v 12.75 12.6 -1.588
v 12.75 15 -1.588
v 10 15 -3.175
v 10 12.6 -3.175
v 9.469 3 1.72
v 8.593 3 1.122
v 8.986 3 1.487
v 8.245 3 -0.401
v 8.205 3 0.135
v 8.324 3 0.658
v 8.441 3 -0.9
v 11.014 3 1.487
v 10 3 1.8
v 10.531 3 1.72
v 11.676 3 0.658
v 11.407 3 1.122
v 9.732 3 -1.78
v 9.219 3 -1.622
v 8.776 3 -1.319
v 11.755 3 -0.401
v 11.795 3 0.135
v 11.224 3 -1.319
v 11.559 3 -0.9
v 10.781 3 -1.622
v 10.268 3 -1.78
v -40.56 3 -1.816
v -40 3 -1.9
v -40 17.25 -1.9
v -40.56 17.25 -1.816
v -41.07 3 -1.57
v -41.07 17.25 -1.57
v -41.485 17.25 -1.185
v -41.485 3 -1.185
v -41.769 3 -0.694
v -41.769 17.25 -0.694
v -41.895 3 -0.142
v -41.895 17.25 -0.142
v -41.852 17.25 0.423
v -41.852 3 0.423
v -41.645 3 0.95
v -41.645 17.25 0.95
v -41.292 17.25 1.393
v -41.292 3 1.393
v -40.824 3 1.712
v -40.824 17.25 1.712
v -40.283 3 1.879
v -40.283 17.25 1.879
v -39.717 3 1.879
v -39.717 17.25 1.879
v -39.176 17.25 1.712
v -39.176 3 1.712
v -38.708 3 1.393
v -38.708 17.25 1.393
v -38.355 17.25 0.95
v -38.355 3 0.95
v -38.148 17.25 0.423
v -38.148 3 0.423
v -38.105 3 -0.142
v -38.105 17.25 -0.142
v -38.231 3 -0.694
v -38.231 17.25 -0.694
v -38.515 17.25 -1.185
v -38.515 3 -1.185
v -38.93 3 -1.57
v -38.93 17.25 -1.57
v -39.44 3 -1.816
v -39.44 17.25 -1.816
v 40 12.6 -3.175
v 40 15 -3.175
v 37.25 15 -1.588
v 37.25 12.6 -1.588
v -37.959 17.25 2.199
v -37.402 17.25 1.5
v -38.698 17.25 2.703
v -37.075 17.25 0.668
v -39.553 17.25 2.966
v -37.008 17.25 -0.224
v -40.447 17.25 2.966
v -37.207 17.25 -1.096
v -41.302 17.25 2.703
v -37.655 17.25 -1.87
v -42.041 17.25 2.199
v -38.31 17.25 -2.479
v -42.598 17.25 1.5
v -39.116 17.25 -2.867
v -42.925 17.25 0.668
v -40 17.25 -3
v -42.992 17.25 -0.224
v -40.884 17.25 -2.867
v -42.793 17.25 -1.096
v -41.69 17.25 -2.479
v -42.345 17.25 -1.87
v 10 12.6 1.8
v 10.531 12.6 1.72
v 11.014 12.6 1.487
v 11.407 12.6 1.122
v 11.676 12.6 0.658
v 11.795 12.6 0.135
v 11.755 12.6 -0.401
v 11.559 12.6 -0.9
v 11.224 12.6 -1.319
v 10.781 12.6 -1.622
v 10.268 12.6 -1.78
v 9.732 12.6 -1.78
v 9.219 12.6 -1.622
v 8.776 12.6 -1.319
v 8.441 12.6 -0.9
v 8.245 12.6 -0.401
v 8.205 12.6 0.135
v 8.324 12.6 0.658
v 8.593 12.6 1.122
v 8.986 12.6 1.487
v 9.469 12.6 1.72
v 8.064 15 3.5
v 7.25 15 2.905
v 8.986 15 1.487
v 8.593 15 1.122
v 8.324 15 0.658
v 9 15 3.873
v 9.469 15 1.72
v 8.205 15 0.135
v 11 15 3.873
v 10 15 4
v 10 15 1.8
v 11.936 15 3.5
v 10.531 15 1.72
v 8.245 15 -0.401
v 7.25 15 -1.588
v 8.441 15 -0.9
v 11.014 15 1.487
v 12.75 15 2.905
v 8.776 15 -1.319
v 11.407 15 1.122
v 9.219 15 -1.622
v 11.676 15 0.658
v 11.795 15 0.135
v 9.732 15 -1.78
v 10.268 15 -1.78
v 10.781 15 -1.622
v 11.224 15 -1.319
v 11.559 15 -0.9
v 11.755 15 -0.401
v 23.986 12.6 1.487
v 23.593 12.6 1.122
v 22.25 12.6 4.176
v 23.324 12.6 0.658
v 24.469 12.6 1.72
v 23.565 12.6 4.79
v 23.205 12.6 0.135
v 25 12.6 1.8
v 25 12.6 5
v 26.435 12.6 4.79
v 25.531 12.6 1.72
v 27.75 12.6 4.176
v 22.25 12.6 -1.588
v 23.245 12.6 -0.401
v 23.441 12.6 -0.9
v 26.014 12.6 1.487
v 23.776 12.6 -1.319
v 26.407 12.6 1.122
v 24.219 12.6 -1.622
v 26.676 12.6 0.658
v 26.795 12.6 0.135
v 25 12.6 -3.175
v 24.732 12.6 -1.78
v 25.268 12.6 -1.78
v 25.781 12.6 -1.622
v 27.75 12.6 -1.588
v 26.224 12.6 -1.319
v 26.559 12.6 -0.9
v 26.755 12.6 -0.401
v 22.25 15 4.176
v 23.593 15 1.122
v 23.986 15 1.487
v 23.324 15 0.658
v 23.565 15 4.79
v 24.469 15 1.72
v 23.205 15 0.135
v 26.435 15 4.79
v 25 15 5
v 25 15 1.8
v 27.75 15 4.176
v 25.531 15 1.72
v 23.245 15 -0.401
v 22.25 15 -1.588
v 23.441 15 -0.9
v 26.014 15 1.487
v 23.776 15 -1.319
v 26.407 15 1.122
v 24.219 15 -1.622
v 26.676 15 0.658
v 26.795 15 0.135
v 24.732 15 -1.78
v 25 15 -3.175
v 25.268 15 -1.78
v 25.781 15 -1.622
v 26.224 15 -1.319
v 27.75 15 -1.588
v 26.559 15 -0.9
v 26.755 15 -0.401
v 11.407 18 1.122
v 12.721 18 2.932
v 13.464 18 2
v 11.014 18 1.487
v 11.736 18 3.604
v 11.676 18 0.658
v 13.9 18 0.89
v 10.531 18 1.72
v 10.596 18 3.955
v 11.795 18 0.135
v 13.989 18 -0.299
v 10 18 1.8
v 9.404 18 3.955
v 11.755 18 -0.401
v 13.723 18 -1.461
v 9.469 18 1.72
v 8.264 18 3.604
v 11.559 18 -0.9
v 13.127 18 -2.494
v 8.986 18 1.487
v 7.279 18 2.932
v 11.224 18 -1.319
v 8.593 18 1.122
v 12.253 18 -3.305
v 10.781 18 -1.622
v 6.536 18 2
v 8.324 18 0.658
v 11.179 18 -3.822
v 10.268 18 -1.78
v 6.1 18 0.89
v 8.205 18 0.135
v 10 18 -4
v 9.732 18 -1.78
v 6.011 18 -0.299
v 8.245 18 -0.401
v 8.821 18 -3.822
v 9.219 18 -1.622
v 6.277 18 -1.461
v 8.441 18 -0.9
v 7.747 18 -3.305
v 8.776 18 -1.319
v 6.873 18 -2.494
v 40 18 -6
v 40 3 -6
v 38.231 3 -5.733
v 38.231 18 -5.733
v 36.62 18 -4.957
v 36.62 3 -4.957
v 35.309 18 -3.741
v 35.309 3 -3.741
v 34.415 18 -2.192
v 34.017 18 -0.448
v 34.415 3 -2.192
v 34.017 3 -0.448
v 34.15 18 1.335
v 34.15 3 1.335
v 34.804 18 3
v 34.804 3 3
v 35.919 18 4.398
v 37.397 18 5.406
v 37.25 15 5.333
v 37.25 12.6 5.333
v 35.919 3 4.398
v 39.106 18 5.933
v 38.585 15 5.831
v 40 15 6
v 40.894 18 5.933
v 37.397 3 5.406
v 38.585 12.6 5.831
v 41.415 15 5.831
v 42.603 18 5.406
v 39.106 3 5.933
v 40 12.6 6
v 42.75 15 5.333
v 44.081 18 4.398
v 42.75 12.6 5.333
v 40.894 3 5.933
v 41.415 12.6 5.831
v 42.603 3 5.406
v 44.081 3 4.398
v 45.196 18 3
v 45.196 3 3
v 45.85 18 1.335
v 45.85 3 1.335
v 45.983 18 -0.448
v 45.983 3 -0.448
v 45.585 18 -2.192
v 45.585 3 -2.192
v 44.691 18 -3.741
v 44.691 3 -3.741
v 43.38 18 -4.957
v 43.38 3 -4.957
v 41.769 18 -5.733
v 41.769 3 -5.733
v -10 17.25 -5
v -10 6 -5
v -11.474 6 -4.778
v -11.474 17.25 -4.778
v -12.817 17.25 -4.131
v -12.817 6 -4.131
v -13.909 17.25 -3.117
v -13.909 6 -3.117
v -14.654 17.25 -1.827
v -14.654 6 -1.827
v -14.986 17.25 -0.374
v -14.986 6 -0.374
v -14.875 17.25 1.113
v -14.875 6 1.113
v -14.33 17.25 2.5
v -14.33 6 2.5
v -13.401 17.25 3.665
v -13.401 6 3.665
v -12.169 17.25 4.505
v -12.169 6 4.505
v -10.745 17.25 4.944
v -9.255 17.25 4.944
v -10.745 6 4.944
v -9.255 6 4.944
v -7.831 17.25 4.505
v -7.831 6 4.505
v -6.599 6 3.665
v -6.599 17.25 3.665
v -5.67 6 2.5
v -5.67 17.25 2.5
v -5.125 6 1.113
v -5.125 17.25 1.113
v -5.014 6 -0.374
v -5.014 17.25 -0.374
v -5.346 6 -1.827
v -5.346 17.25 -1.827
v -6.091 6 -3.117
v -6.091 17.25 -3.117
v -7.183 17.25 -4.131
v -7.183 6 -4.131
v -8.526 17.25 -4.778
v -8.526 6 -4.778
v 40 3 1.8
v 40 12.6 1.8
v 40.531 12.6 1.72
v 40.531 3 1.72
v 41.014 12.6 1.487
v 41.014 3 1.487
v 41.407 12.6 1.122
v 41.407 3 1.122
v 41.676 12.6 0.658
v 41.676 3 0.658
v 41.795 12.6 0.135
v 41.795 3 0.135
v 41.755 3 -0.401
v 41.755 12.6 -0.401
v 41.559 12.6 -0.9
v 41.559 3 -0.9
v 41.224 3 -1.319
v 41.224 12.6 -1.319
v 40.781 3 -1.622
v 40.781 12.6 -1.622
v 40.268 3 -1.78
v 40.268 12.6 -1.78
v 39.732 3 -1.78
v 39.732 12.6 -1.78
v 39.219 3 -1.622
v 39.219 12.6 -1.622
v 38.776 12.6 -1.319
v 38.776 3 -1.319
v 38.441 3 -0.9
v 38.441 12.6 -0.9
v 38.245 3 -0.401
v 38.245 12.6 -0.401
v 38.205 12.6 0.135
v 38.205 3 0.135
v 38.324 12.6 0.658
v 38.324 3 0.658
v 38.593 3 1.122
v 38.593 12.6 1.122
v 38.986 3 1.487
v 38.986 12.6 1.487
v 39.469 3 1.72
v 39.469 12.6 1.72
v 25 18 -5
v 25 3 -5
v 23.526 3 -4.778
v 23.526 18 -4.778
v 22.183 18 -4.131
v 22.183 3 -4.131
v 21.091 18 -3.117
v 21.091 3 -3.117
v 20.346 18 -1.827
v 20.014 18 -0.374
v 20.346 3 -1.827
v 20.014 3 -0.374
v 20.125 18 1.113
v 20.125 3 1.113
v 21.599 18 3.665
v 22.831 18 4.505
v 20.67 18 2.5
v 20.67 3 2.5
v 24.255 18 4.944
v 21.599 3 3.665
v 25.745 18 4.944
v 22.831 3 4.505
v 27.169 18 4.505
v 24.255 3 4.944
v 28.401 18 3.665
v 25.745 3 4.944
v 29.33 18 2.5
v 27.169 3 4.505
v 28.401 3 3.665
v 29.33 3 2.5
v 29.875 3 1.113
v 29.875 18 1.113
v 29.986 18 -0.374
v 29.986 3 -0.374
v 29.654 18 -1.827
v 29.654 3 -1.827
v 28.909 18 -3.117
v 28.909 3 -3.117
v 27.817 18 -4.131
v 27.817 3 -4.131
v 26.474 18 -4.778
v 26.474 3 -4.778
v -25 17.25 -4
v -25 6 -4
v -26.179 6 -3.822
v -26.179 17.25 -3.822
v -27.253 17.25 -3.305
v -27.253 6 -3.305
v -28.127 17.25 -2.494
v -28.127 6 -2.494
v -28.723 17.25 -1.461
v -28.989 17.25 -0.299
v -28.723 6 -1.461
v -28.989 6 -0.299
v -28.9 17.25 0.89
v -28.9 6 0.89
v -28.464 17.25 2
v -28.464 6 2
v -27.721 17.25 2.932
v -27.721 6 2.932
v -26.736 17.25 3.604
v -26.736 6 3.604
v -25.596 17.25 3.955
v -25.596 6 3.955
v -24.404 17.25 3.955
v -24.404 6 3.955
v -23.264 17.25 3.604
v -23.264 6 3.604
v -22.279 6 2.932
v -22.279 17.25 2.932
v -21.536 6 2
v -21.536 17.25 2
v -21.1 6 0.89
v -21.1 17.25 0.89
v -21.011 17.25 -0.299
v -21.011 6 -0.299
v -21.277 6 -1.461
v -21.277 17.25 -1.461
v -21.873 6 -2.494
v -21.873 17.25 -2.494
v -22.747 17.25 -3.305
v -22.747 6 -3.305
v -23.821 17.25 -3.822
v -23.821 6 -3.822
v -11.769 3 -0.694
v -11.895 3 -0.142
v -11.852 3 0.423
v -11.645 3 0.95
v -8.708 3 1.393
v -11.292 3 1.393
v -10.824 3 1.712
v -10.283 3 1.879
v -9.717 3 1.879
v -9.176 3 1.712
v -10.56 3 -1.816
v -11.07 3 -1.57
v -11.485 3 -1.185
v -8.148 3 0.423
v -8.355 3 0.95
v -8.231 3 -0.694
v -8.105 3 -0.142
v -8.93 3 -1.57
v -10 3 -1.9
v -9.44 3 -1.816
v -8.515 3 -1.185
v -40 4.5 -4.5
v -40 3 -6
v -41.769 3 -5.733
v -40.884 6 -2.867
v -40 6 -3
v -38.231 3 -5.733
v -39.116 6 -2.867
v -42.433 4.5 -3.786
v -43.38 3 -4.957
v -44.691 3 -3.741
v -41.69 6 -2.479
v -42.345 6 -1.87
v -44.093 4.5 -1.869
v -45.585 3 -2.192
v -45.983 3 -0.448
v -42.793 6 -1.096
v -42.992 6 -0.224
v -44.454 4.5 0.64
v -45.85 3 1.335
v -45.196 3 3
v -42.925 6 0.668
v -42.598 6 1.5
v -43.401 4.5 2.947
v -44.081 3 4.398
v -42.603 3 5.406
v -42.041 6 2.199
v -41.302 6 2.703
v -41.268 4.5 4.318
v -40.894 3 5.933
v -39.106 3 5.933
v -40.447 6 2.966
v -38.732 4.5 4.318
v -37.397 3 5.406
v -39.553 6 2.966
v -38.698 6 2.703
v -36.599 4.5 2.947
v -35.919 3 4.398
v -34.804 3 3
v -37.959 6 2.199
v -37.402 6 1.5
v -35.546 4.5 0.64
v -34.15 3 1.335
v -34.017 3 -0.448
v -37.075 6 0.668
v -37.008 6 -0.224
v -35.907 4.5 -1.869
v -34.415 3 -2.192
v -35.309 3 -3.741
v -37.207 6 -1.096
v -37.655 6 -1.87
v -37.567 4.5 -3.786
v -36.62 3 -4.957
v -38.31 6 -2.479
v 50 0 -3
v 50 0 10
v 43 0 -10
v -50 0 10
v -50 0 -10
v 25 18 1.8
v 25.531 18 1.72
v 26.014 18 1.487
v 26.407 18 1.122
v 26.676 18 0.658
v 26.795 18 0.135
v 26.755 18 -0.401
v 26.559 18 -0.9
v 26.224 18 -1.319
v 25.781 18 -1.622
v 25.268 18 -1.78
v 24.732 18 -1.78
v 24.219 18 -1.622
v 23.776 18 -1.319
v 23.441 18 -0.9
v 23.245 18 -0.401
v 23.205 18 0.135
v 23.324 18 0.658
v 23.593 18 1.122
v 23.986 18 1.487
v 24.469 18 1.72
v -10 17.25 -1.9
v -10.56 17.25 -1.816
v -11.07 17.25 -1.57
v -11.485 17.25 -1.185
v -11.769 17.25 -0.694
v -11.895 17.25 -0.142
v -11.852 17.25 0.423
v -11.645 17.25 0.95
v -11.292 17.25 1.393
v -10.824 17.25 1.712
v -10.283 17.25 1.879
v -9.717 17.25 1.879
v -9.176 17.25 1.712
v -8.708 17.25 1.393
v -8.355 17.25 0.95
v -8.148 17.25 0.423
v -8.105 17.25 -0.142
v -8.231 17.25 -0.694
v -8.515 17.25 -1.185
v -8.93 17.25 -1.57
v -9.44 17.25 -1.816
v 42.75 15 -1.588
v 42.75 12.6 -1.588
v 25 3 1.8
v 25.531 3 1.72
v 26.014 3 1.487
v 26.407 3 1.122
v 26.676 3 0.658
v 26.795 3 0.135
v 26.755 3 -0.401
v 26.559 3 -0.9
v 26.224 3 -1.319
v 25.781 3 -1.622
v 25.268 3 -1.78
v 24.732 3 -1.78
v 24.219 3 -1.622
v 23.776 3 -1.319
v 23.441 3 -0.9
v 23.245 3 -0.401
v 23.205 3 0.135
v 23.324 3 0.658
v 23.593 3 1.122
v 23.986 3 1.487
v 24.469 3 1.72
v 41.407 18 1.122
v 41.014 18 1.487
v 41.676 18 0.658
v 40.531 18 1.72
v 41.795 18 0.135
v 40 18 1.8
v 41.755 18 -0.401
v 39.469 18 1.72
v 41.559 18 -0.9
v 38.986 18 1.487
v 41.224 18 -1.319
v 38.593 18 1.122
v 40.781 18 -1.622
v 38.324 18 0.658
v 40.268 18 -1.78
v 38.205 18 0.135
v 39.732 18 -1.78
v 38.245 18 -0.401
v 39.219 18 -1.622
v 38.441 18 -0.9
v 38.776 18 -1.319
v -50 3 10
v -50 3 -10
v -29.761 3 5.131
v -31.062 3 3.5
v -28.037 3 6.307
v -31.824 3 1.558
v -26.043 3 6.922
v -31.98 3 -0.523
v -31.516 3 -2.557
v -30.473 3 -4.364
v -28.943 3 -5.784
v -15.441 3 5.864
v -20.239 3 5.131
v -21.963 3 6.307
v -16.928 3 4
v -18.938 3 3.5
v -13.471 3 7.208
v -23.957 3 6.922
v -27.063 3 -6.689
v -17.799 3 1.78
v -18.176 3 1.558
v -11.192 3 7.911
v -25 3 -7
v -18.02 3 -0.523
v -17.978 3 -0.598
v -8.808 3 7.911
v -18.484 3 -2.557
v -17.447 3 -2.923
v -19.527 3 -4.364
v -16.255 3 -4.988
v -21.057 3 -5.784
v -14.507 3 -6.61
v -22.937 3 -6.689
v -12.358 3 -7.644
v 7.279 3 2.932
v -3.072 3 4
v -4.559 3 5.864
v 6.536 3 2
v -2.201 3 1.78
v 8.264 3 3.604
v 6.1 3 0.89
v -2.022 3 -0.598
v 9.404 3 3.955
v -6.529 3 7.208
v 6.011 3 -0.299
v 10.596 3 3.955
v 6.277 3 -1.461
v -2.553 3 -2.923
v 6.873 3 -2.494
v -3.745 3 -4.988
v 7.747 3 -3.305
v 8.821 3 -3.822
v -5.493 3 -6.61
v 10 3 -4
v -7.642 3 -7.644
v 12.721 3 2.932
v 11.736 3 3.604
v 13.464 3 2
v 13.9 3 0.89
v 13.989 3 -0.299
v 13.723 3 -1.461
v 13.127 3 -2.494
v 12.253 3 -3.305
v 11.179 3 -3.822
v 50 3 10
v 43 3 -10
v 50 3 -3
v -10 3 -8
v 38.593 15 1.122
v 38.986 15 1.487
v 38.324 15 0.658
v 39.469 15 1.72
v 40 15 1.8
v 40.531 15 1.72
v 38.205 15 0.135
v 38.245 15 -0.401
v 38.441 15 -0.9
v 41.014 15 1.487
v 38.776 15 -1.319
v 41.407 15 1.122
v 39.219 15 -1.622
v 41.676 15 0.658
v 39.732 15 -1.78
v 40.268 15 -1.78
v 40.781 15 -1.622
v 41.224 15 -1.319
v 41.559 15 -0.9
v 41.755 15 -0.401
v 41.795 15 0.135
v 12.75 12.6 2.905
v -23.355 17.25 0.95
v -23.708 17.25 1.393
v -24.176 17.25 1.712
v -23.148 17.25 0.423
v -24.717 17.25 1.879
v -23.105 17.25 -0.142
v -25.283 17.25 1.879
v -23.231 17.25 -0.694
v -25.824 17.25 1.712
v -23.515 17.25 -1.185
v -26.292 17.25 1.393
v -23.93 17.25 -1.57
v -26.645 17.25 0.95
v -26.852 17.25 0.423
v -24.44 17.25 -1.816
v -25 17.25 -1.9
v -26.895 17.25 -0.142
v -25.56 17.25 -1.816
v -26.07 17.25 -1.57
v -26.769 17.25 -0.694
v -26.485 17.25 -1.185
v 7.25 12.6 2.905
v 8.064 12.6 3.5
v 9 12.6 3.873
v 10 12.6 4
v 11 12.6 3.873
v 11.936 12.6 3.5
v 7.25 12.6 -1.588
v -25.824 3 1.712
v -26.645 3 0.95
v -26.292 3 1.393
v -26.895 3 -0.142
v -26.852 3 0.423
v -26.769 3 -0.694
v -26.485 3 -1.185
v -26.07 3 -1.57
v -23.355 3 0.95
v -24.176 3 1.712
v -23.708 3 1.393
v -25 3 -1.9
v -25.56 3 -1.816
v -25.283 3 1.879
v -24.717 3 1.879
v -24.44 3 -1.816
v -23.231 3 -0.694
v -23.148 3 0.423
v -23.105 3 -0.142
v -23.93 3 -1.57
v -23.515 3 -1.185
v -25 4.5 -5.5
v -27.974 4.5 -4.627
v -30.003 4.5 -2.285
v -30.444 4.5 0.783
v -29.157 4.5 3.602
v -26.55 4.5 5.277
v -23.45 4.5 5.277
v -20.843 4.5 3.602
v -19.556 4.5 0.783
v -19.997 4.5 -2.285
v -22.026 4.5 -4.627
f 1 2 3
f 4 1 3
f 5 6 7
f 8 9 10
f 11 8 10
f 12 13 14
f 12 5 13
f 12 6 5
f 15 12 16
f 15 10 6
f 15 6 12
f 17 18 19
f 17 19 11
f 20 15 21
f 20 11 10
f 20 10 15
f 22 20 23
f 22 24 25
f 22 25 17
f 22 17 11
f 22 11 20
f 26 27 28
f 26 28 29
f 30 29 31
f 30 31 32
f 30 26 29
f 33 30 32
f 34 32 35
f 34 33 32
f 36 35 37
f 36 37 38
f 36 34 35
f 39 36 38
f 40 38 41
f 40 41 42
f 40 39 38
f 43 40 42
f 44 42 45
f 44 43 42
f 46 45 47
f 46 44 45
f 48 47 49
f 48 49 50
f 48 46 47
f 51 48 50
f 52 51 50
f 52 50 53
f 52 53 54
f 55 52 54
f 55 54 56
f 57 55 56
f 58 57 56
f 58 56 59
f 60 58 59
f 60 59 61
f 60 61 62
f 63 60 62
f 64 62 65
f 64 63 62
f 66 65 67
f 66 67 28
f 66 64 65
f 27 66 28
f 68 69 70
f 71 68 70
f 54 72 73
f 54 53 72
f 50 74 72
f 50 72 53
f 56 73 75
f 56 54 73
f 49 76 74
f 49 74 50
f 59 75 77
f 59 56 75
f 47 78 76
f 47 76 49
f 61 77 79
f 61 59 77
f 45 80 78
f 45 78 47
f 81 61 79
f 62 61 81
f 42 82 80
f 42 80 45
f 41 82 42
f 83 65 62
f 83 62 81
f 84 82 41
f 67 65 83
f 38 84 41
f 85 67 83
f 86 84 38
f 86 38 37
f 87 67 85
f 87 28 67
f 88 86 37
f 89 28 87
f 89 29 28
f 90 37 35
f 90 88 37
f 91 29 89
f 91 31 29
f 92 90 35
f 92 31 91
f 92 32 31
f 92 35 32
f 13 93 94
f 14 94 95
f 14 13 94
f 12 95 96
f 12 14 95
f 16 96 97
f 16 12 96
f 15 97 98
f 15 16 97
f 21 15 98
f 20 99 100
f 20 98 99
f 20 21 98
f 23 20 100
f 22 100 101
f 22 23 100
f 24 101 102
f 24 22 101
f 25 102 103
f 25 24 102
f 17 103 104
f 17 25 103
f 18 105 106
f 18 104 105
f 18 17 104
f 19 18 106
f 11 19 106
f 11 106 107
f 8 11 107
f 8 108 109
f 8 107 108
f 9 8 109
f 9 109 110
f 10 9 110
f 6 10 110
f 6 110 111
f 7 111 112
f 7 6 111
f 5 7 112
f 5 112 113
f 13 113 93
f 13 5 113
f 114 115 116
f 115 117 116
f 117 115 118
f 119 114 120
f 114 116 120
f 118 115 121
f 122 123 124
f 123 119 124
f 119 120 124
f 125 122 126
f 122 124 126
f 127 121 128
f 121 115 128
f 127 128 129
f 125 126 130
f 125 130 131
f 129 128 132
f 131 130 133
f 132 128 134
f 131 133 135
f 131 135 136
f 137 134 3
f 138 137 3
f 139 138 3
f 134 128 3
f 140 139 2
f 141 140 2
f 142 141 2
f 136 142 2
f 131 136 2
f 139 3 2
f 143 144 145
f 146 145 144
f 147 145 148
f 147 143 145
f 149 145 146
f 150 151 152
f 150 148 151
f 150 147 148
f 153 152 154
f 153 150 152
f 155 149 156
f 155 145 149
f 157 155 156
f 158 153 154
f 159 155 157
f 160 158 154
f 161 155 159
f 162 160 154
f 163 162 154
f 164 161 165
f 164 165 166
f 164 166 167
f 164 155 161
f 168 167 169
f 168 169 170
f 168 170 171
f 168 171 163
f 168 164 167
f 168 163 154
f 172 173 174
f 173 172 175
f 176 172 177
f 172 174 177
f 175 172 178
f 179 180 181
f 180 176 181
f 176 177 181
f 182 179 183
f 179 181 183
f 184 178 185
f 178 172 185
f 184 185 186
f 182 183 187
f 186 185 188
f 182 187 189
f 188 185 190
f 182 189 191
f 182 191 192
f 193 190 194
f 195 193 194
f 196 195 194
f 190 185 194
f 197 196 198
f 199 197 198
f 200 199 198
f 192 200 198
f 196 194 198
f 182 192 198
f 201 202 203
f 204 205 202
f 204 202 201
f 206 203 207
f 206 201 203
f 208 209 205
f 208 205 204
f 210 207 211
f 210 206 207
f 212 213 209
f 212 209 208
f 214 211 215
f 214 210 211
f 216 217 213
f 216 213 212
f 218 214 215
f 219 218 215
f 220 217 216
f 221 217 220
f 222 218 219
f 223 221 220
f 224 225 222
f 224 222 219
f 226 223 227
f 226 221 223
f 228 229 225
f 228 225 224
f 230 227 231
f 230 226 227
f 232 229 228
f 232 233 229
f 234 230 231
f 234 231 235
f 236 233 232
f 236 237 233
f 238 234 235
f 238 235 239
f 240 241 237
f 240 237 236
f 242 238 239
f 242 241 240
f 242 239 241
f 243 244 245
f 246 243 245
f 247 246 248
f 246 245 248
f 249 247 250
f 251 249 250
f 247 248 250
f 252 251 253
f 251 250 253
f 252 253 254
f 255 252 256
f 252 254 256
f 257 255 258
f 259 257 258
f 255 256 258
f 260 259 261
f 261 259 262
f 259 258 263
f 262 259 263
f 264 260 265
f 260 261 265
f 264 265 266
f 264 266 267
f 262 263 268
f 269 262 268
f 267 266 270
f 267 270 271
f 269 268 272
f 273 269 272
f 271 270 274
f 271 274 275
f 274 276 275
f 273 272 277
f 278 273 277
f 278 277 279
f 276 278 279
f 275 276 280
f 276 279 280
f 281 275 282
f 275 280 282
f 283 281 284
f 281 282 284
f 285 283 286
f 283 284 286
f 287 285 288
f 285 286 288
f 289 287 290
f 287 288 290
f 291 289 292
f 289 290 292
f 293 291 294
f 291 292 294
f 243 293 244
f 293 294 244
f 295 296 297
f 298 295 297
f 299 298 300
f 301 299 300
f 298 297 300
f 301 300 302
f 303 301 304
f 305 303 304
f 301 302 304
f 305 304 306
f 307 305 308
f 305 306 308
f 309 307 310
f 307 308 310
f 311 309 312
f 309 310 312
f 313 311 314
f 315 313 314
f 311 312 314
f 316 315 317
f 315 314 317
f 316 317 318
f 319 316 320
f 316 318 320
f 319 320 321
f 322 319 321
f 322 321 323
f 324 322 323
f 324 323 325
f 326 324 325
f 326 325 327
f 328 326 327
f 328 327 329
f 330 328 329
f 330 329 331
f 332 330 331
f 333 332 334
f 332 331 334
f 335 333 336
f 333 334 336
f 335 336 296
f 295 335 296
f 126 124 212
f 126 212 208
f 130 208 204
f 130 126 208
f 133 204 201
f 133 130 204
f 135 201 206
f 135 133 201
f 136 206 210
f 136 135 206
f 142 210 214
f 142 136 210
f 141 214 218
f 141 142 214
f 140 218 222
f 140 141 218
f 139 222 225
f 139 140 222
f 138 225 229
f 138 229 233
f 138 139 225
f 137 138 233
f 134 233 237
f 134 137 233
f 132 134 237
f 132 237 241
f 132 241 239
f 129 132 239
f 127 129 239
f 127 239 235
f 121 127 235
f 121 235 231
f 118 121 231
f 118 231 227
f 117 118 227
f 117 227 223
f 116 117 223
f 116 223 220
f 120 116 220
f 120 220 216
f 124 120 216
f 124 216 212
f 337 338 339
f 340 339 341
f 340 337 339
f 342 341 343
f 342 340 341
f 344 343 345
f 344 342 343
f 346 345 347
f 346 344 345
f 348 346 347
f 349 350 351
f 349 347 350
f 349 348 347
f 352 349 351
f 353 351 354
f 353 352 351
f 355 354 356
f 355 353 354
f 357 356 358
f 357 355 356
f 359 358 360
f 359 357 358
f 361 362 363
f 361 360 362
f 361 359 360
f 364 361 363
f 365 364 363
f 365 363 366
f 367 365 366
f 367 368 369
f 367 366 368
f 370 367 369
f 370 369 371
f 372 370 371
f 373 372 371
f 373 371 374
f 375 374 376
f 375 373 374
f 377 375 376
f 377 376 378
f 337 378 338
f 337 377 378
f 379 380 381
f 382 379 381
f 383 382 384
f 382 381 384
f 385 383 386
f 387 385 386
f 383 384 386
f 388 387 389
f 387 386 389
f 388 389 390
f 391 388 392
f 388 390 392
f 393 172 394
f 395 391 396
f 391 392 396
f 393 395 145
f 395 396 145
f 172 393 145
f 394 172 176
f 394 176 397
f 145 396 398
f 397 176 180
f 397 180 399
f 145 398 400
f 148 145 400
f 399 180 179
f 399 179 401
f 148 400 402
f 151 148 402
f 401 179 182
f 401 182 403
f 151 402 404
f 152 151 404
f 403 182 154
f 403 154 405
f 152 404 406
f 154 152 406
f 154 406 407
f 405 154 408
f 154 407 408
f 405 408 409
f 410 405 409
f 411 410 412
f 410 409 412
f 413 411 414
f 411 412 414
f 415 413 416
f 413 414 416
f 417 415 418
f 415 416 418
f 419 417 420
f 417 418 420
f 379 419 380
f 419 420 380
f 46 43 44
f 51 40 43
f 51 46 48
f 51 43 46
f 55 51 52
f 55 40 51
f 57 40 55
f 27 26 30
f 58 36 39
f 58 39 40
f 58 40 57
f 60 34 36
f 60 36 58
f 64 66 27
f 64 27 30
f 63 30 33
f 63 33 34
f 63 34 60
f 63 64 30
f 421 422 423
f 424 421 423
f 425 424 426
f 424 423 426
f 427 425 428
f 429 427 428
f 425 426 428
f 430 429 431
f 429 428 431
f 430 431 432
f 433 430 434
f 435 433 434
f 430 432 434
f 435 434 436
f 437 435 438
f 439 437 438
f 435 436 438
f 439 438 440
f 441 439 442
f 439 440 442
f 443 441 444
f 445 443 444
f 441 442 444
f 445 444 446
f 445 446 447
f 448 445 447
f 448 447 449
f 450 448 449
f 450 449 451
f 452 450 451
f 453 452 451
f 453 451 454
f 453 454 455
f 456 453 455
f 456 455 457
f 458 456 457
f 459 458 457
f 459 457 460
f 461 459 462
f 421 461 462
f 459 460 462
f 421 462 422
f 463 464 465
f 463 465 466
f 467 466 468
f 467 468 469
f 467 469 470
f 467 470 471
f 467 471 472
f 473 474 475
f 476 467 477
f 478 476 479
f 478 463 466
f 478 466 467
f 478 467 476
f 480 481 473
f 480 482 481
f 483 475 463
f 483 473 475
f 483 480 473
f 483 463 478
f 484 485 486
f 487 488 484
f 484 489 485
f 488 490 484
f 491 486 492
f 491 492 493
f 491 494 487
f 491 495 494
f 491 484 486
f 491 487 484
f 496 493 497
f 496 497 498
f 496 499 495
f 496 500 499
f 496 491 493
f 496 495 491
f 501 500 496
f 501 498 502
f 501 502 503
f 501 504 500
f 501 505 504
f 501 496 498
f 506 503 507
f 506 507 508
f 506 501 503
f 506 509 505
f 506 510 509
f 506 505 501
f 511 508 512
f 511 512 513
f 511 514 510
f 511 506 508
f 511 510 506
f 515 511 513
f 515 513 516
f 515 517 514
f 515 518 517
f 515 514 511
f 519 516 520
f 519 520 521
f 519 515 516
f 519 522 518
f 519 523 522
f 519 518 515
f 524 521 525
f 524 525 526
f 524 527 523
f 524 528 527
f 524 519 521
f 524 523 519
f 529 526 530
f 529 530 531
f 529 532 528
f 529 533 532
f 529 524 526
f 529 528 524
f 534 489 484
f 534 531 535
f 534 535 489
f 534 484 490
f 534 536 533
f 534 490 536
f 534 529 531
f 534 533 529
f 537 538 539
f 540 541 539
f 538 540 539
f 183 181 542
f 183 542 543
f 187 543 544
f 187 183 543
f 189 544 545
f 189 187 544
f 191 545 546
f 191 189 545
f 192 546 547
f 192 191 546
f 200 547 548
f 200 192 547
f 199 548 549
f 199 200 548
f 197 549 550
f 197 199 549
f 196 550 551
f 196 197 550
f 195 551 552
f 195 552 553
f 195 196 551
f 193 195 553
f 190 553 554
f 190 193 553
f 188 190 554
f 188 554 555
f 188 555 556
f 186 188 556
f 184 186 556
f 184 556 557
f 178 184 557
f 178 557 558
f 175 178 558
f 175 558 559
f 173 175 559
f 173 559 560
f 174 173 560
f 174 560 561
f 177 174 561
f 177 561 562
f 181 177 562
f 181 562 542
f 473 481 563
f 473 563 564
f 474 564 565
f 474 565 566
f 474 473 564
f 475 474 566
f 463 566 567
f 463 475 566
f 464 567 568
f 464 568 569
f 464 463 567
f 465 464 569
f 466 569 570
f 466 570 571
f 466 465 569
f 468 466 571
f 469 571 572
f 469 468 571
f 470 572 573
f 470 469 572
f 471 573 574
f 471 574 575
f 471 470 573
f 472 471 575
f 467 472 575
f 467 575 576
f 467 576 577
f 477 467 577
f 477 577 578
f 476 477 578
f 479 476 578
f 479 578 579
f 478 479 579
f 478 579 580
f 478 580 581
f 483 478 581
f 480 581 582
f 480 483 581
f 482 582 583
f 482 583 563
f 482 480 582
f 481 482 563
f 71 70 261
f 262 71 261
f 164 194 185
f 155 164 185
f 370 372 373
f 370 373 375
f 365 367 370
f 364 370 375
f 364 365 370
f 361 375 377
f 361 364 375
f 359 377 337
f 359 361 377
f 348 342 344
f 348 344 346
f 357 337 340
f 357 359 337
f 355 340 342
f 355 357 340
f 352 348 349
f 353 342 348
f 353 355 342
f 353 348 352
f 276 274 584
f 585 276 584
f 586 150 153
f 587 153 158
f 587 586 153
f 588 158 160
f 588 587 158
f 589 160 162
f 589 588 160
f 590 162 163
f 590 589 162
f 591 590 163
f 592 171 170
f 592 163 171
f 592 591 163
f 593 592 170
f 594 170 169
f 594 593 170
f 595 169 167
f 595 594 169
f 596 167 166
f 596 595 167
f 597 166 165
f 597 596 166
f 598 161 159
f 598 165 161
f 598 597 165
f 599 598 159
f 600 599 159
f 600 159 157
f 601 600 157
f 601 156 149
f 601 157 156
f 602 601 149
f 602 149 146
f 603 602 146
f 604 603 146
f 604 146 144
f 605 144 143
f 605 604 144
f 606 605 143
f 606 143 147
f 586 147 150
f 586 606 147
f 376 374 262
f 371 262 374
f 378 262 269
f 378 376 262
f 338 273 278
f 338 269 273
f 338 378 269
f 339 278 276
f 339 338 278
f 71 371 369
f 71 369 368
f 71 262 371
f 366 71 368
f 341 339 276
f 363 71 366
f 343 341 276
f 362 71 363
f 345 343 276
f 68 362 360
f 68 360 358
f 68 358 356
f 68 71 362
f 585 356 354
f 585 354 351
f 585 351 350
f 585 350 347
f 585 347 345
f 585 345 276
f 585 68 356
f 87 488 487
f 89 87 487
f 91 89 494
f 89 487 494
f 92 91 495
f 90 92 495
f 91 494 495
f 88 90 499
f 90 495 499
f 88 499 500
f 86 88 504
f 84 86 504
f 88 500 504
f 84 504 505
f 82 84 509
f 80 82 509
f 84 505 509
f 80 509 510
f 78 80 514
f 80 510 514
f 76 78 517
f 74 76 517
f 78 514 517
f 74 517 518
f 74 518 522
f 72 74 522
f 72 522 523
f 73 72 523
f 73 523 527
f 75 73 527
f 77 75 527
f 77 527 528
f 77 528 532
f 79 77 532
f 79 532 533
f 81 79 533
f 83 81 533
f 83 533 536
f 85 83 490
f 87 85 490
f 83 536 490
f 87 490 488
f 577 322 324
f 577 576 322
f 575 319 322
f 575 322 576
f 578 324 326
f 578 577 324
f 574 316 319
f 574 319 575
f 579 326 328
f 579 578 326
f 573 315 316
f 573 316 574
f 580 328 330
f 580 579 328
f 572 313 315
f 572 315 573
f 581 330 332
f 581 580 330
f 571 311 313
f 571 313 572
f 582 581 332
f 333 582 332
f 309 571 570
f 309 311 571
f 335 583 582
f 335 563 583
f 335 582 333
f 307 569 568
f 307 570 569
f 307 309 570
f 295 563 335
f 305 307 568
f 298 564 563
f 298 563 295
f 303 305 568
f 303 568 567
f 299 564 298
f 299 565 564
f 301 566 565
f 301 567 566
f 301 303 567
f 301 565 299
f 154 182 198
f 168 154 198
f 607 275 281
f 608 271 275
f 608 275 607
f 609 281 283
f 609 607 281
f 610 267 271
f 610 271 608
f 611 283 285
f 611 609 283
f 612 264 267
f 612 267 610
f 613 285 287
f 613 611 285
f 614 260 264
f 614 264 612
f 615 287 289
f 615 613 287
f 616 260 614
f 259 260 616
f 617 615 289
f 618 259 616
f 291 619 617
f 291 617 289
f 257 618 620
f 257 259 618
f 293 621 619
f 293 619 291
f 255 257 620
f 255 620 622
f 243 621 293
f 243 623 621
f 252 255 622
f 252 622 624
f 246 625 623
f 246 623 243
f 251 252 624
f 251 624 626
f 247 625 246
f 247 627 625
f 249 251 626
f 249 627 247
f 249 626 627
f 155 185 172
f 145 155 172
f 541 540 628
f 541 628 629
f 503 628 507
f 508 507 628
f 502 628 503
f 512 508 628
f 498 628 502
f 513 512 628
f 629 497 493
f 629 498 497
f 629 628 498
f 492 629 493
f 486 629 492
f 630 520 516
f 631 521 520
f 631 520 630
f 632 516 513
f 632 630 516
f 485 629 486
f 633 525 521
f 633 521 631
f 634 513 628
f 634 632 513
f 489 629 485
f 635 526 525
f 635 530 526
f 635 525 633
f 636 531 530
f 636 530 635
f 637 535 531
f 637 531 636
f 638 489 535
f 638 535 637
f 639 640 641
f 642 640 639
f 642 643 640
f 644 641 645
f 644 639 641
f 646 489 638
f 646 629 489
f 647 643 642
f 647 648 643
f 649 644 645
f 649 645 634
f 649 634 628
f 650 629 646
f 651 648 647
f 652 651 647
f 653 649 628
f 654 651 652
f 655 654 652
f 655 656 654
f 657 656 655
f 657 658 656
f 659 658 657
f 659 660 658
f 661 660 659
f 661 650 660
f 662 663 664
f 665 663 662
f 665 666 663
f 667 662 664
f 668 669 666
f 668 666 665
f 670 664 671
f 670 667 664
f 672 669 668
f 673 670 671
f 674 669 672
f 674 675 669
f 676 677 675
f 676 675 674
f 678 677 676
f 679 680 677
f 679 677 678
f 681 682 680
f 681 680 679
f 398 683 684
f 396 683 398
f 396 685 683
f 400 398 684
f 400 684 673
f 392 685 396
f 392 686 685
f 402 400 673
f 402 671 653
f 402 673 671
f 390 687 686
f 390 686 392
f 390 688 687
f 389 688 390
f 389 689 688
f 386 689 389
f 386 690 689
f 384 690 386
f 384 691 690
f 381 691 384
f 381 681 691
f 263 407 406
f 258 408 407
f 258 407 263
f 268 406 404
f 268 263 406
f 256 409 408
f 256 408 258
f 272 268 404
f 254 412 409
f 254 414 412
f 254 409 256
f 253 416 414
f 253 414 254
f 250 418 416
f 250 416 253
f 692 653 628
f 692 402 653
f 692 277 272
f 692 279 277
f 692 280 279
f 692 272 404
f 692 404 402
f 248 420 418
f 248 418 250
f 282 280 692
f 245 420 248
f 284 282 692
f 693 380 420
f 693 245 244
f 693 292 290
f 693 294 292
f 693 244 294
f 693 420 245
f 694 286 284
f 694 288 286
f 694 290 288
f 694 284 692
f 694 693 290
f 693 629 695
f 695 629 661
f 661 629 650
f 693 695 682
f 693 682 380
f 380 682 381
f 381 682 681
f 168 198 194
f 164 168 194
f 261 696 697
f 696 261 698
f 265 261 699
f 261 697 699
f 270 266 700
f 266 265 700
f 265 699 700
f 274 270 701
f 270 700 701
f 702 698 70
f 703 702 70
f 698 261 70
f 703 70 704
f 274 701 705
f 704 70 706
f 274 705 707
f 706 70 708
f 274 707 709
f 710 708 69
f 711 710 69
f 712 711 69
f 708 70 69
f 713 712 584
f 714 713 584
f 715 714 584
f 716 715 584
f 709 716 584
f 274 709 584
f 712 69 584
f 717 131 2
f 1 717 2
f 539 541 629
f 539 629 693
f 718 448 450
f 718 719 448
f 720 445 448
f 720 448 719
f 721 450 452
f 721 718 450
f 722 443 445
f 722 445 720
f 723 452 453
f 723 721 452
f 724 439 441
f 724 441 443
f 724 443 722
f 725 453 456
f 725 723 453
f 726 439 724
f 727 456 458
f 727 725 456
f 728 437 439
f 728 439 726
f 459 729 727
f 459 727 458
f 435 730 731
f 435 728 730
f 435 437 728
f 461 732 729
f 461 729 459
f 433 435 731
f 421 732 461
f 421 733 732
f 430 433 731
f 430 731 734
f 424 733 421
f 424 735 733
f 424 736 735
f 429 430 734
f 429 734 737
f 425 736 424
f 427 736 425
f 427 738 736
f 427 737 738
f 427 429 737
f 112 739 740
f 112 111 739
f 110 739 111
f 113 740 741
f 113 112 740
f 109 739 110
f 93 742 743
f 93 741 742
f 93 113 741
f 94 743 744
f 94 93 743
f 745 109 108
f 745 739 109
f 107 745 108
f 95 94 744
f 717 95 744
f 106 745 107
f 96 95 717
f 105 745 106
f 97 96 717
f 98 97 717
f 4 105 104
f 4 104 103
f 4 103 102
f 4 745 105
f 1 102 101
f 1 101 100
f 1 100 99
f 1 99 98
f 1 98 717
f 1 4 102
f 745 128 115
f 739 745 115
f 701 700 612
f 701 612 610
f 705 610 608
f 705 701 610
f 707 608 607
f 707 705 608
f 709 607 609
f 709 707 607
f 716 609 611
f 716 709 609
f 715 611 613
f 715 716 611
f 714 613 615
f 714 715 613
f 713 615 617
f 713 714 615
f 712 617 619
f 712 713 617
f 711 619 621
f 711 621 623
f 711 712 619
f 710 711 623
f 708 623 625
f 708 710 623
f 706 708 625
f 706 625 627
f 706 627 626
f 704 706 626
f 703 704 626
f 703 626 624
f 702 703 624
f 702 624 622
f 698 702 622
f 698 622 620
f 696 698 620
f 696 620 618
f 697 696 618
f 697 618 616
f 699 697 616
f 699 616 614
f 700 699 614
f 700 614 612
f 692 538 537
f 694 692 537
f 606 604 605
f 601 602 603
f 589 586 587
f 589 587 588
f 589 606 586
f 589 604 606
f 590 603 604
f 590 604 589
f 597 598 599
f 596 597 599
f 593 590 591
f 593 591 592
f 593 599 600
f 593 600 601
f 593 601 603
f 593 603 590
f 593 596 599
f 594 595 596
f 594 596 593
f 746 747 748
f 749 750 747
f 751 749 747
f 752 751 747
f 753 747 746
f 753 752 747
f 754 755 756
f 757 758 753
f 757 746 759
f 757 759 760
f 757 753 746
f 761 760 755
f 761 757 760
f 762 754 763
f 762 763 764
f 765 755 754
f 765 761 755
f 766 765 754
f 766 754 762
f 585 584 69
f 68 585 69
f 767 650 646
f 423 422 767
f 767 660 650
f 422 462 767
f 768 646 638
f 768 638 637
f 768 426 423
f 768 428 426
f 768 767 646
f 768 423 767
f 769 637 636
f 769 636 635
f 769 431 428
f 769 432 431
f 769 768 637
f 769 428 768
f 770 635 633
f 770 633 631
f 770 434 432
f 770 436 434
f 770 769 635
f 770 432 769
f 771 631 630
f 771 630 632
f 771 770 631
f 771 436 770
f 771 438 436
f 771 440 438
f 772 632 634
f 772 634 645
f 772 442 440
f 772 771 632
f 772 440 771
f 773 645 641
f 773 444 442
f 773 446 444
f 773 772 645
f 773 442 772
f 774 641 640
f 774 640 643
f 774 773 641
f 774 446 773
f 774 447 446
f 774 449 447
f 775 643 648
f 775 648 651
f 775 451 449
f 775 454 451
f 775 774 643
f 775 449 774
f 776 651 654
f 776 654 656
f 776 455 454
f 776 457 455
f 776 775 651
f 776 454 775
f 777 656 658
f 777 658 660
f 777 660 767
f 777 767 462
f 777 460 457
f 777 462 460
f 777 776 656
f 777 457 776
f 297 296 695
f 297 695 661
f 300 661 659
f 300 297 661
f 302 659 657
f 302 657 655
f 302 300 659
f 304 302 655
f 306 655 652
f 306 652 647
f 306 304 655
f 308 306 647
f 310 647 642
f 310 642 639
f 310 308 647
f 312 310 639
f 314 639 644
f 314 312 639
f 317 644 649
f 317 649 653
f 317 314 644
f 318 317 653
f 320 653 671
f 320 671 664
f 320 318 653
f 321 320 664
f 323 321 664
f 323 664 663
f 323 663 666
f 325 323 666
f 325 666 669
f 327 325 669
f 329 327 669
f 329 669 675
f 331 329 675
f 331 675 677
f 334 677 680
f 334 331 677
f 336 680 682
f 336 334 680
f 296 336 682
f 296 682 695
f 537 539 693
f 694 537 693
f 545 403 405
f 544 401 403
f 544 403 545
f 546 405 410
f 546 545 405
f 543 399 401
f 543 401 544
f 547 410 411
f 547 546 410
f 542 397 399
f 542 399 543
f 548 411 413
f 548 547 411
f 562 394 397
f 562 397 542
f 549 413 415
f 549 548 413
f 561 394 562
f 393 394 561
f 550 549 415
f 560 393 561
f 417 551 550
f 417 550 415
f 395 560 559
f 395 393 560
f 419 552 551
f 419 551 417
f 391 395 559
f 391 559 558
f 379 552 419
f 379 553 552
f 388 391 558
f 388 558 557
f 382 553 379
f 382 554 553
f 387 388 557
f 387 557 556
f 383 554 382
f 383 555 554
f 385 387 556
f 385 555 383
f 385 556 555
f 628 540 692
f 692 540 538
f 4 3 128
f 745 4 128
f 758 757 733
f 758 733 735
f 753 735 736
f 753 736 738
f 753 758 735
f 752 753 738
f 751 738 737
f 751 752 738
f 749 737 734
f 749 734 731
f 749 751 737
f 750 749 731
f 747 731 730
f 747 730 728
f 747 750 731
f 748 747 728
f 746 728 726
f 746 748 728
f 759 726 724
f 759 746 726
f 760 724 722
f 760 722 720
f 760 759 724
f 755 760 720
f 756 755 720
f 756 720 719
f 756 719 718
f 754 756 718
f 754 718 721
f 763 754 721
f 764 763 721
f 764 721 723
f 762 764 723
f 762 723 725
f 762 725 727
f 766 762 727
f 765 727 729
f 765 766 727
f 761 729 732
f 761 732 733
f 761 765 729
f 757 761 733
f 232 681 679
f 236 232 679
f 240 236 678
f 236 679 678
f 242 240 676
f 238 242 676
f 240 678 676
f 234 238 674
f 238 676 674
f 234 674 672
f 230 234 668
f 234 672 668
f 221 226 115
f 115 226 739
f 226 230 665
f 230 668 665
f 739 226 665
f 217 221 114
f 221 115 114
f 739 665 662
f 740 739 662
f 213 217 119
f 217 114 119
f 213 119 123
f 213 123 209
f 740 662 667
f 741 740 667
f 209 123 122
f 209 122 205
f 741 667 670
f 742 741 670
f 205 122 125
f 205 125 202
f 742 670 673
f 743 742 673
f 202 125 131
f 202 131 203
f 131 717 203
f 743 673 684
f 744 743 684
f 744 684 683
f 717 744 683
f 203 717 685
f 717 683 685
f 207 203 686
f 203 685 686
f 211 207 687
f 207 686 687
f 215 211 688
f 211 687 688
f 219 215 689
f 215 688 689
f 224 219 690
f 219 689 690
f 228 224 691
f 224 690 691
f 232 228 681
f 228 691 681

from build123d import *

# Parameters (mm, degrees)
SKETCH1_W           = 100
SKETCH1_H           = 20
BOSS_EXTRUDE1_DEPTH = 3
SKETCH2_R           = 4
SKETCH2_R_2         = 1.9
SKETCH2_R_3         = 3
SKETCH2_R_4         = 5
BOSS_EXTRUDE2_DEPTH = 14.25
CHAMFER1_SIZE       = 3
CHAMFER2_SIZE       = 3
CHAMFER3_SIZE       = 3
SKETCH14_R          = 4
SKETCH14_R_2        = 1.8
SKETCH14_R_3        = 5
SKETCH14_R_4        = 6
BOSS_EXTRUDE3_DEPTH = 15
CHAMFER4_SIZE       = 7
CUT_EXTRUDE2_START  = 12
CUT_EXTRUDE2_DEPTH  = 2.4
LPATTERN2_COUNT     = 3
LPATTERN2_PITCH     = 15


with BuildPart() as part:
    # Sketch1 → Boss-Extrude1 (new body)
    with BuildSketch(Plane(origin=(0, 0, 0), x_dir=(1, 0, 0), z_dir=(0, 1, 0))):
        Rectangle(SKETCH1_W, SKETCH1_H)
    extrude(amount=BOSS_EXTRUDE1_DEPTH)

    # Sketch2 → Boss-Extrude2 (add)
    # profile 1 of 3: a face of its own
    with BuildSketch(Plane(origin=(0, 3, 0), x_dir=(1, 0, 0), z_dir=(0, 1, 0))):
        with Locations(Location((-25, 0, 0), (0, 0, 90))):
            Circle(SKETCH2_R)
        with Locations(Location((-25, 0, 0), (0, 0, 90))):
            Circle(SKETCH2_R_2, mode=Mode.SUBTRACT)
    # profile 2 of 3: a face of its own
    with BuildSketch(Plane(origin=(0, 3, 0), x_dir=(1, 0, 0), z_dir=(0, 1, 0))):
        with Locations(Location((-40, 0, 0), (0, 0, 90))):
            Circle(SKETCH2_R_3)
        with Locations(Location((-40, 0, 0), (0, 0, 90))):
            Circle(SKETCH2_R_2, mode=Mode.SUBTRACT)
    # profile 3 of 3: a face of its own
    with BuildSketch(Plane(origin=(0, 3, 0), x_dir=(1, 0, 0), z_dir=(0, 1, 0))):
        with Locations(Location((-10, 0, 0), (0, 0, 90))):
            Circle(SKETCH2_R_4)
        with Locations(Location((-10, 0, 0), (0, 0, 90))):
            Circle(SKETCH2_R_2, mode=Mode.SUBTRACT)
    extrude(amount=BOSS_EXTRUDE2_DEPTH)

    # Chamfer1
    chamfer1_edges = [part.edges().sort_by_distance(p)[0] for p in [
        (-40, 3, 3),
    ]]
    chamfer(chamfer1_edges, length=CHAMFER1_SIZE)

    # Chamfer2
    chamfer2_edges = [part.edges().sort_by_distance(p)[0] for p in [
        (-25, 3, 4),
    ]]
    chamfer(chamfer2_edges, length=CHAMFER2_SIZE)

    # Chamfer3
    chamfer3_edges = [part.edges().sort_by_distance(p)[0] for p in [
        (-10, 3, 5),
    ]]
    chamfer(chamfer3_edges, length=CHAMFER3_SIZE - 0.0001)  # a hair under: the kernel refuses the full size

    # Sketch14 → Boss-Extrude3 (add)
    # profile 1 of 3: a face of its own
    with BuildSketch(Plane(origin=(0, 3, 0), x_dir=(1, 0, 0), z_dir=(0, 1, 0))):
        with Locations(Location((10, 0, 0), (0, 0, 90))):
            Circle(SKETCH14_R)
        with Locations(Location((10, 0, 0), (0, 0, 270))):
            Circle(SKETCH14_R_2, mode=Mode.SUBTRACT)
    # profile 2 of 3: a face of its own
    with BuildSketch(Plane(origin=(0, 3, 0), x_dir=(1, 0, 0), z_dir=(0, 1, 0))):
        with Locations(Location((25, 0, 0), (0, 0, 90))):
            Circle(SKETCH14_R_3)
        with Locations(Location((25, 0, 0), (0, 0, 270))):
            Circle(SKETCH14_R_2, mode=Mode.SUBTRACT)
    # profile 3 of 3: a face of its own
    with BuildSketch(Plane(origin=(0, 3, 0), x_dir=(1, 0, 0), z_dir=(0, 1, 0))):
        with Locations(Location((40, 0, 0), (0, 0, 90))):
            Circle(SKETCH14_R_4)
        with Locations(Location((40, 0, 0), (0, 0, 270))):
            Circle(SKETCH14_R_2, mode=Mode.SUBTRACT)
    extrude(amount=BOSS_EXTRUDE3_DEPTH)

    # Chamfer4
    chamfer4_edges = [part.edges().sort_by_distance(p)[0] for p in [
        (50, 1.5, -10),
    ]]
    chamfer(chamfer4_edges, length=CHAMFER4_SIZE)

    # Sketch16 → Cut-Extrude2 (cut)
    with BuildSketch(Plane(origin=(0, 3, 0), x_dir=(1, 0, 0), z_dir=(0, 1, 0)).offset(CUT_EXTRUDE2_START)):
        Polygon((7.25, -1.58771324), (7.25, -10), (12.75, -10), (12.75, -1.58771324), (12.75, 1.58771324), (10, 3.175426481), (7.25, 1.58771324), align=None)
    cut_extrude2 = extrude(amount=-CUT_EXTRUDE2_DEPTH, mode=Mode.SUBTRACT)

    # LPattern2: Cut-Extrude2 ×3
    with Locations(*[(i * LPATTERN2_PITCH, 0, 0) for i in range(1, LPATTERN2_COUNT)]):
        add(cut_extrude2, mode=Mode.SUBTRACT)


solid = part.part
